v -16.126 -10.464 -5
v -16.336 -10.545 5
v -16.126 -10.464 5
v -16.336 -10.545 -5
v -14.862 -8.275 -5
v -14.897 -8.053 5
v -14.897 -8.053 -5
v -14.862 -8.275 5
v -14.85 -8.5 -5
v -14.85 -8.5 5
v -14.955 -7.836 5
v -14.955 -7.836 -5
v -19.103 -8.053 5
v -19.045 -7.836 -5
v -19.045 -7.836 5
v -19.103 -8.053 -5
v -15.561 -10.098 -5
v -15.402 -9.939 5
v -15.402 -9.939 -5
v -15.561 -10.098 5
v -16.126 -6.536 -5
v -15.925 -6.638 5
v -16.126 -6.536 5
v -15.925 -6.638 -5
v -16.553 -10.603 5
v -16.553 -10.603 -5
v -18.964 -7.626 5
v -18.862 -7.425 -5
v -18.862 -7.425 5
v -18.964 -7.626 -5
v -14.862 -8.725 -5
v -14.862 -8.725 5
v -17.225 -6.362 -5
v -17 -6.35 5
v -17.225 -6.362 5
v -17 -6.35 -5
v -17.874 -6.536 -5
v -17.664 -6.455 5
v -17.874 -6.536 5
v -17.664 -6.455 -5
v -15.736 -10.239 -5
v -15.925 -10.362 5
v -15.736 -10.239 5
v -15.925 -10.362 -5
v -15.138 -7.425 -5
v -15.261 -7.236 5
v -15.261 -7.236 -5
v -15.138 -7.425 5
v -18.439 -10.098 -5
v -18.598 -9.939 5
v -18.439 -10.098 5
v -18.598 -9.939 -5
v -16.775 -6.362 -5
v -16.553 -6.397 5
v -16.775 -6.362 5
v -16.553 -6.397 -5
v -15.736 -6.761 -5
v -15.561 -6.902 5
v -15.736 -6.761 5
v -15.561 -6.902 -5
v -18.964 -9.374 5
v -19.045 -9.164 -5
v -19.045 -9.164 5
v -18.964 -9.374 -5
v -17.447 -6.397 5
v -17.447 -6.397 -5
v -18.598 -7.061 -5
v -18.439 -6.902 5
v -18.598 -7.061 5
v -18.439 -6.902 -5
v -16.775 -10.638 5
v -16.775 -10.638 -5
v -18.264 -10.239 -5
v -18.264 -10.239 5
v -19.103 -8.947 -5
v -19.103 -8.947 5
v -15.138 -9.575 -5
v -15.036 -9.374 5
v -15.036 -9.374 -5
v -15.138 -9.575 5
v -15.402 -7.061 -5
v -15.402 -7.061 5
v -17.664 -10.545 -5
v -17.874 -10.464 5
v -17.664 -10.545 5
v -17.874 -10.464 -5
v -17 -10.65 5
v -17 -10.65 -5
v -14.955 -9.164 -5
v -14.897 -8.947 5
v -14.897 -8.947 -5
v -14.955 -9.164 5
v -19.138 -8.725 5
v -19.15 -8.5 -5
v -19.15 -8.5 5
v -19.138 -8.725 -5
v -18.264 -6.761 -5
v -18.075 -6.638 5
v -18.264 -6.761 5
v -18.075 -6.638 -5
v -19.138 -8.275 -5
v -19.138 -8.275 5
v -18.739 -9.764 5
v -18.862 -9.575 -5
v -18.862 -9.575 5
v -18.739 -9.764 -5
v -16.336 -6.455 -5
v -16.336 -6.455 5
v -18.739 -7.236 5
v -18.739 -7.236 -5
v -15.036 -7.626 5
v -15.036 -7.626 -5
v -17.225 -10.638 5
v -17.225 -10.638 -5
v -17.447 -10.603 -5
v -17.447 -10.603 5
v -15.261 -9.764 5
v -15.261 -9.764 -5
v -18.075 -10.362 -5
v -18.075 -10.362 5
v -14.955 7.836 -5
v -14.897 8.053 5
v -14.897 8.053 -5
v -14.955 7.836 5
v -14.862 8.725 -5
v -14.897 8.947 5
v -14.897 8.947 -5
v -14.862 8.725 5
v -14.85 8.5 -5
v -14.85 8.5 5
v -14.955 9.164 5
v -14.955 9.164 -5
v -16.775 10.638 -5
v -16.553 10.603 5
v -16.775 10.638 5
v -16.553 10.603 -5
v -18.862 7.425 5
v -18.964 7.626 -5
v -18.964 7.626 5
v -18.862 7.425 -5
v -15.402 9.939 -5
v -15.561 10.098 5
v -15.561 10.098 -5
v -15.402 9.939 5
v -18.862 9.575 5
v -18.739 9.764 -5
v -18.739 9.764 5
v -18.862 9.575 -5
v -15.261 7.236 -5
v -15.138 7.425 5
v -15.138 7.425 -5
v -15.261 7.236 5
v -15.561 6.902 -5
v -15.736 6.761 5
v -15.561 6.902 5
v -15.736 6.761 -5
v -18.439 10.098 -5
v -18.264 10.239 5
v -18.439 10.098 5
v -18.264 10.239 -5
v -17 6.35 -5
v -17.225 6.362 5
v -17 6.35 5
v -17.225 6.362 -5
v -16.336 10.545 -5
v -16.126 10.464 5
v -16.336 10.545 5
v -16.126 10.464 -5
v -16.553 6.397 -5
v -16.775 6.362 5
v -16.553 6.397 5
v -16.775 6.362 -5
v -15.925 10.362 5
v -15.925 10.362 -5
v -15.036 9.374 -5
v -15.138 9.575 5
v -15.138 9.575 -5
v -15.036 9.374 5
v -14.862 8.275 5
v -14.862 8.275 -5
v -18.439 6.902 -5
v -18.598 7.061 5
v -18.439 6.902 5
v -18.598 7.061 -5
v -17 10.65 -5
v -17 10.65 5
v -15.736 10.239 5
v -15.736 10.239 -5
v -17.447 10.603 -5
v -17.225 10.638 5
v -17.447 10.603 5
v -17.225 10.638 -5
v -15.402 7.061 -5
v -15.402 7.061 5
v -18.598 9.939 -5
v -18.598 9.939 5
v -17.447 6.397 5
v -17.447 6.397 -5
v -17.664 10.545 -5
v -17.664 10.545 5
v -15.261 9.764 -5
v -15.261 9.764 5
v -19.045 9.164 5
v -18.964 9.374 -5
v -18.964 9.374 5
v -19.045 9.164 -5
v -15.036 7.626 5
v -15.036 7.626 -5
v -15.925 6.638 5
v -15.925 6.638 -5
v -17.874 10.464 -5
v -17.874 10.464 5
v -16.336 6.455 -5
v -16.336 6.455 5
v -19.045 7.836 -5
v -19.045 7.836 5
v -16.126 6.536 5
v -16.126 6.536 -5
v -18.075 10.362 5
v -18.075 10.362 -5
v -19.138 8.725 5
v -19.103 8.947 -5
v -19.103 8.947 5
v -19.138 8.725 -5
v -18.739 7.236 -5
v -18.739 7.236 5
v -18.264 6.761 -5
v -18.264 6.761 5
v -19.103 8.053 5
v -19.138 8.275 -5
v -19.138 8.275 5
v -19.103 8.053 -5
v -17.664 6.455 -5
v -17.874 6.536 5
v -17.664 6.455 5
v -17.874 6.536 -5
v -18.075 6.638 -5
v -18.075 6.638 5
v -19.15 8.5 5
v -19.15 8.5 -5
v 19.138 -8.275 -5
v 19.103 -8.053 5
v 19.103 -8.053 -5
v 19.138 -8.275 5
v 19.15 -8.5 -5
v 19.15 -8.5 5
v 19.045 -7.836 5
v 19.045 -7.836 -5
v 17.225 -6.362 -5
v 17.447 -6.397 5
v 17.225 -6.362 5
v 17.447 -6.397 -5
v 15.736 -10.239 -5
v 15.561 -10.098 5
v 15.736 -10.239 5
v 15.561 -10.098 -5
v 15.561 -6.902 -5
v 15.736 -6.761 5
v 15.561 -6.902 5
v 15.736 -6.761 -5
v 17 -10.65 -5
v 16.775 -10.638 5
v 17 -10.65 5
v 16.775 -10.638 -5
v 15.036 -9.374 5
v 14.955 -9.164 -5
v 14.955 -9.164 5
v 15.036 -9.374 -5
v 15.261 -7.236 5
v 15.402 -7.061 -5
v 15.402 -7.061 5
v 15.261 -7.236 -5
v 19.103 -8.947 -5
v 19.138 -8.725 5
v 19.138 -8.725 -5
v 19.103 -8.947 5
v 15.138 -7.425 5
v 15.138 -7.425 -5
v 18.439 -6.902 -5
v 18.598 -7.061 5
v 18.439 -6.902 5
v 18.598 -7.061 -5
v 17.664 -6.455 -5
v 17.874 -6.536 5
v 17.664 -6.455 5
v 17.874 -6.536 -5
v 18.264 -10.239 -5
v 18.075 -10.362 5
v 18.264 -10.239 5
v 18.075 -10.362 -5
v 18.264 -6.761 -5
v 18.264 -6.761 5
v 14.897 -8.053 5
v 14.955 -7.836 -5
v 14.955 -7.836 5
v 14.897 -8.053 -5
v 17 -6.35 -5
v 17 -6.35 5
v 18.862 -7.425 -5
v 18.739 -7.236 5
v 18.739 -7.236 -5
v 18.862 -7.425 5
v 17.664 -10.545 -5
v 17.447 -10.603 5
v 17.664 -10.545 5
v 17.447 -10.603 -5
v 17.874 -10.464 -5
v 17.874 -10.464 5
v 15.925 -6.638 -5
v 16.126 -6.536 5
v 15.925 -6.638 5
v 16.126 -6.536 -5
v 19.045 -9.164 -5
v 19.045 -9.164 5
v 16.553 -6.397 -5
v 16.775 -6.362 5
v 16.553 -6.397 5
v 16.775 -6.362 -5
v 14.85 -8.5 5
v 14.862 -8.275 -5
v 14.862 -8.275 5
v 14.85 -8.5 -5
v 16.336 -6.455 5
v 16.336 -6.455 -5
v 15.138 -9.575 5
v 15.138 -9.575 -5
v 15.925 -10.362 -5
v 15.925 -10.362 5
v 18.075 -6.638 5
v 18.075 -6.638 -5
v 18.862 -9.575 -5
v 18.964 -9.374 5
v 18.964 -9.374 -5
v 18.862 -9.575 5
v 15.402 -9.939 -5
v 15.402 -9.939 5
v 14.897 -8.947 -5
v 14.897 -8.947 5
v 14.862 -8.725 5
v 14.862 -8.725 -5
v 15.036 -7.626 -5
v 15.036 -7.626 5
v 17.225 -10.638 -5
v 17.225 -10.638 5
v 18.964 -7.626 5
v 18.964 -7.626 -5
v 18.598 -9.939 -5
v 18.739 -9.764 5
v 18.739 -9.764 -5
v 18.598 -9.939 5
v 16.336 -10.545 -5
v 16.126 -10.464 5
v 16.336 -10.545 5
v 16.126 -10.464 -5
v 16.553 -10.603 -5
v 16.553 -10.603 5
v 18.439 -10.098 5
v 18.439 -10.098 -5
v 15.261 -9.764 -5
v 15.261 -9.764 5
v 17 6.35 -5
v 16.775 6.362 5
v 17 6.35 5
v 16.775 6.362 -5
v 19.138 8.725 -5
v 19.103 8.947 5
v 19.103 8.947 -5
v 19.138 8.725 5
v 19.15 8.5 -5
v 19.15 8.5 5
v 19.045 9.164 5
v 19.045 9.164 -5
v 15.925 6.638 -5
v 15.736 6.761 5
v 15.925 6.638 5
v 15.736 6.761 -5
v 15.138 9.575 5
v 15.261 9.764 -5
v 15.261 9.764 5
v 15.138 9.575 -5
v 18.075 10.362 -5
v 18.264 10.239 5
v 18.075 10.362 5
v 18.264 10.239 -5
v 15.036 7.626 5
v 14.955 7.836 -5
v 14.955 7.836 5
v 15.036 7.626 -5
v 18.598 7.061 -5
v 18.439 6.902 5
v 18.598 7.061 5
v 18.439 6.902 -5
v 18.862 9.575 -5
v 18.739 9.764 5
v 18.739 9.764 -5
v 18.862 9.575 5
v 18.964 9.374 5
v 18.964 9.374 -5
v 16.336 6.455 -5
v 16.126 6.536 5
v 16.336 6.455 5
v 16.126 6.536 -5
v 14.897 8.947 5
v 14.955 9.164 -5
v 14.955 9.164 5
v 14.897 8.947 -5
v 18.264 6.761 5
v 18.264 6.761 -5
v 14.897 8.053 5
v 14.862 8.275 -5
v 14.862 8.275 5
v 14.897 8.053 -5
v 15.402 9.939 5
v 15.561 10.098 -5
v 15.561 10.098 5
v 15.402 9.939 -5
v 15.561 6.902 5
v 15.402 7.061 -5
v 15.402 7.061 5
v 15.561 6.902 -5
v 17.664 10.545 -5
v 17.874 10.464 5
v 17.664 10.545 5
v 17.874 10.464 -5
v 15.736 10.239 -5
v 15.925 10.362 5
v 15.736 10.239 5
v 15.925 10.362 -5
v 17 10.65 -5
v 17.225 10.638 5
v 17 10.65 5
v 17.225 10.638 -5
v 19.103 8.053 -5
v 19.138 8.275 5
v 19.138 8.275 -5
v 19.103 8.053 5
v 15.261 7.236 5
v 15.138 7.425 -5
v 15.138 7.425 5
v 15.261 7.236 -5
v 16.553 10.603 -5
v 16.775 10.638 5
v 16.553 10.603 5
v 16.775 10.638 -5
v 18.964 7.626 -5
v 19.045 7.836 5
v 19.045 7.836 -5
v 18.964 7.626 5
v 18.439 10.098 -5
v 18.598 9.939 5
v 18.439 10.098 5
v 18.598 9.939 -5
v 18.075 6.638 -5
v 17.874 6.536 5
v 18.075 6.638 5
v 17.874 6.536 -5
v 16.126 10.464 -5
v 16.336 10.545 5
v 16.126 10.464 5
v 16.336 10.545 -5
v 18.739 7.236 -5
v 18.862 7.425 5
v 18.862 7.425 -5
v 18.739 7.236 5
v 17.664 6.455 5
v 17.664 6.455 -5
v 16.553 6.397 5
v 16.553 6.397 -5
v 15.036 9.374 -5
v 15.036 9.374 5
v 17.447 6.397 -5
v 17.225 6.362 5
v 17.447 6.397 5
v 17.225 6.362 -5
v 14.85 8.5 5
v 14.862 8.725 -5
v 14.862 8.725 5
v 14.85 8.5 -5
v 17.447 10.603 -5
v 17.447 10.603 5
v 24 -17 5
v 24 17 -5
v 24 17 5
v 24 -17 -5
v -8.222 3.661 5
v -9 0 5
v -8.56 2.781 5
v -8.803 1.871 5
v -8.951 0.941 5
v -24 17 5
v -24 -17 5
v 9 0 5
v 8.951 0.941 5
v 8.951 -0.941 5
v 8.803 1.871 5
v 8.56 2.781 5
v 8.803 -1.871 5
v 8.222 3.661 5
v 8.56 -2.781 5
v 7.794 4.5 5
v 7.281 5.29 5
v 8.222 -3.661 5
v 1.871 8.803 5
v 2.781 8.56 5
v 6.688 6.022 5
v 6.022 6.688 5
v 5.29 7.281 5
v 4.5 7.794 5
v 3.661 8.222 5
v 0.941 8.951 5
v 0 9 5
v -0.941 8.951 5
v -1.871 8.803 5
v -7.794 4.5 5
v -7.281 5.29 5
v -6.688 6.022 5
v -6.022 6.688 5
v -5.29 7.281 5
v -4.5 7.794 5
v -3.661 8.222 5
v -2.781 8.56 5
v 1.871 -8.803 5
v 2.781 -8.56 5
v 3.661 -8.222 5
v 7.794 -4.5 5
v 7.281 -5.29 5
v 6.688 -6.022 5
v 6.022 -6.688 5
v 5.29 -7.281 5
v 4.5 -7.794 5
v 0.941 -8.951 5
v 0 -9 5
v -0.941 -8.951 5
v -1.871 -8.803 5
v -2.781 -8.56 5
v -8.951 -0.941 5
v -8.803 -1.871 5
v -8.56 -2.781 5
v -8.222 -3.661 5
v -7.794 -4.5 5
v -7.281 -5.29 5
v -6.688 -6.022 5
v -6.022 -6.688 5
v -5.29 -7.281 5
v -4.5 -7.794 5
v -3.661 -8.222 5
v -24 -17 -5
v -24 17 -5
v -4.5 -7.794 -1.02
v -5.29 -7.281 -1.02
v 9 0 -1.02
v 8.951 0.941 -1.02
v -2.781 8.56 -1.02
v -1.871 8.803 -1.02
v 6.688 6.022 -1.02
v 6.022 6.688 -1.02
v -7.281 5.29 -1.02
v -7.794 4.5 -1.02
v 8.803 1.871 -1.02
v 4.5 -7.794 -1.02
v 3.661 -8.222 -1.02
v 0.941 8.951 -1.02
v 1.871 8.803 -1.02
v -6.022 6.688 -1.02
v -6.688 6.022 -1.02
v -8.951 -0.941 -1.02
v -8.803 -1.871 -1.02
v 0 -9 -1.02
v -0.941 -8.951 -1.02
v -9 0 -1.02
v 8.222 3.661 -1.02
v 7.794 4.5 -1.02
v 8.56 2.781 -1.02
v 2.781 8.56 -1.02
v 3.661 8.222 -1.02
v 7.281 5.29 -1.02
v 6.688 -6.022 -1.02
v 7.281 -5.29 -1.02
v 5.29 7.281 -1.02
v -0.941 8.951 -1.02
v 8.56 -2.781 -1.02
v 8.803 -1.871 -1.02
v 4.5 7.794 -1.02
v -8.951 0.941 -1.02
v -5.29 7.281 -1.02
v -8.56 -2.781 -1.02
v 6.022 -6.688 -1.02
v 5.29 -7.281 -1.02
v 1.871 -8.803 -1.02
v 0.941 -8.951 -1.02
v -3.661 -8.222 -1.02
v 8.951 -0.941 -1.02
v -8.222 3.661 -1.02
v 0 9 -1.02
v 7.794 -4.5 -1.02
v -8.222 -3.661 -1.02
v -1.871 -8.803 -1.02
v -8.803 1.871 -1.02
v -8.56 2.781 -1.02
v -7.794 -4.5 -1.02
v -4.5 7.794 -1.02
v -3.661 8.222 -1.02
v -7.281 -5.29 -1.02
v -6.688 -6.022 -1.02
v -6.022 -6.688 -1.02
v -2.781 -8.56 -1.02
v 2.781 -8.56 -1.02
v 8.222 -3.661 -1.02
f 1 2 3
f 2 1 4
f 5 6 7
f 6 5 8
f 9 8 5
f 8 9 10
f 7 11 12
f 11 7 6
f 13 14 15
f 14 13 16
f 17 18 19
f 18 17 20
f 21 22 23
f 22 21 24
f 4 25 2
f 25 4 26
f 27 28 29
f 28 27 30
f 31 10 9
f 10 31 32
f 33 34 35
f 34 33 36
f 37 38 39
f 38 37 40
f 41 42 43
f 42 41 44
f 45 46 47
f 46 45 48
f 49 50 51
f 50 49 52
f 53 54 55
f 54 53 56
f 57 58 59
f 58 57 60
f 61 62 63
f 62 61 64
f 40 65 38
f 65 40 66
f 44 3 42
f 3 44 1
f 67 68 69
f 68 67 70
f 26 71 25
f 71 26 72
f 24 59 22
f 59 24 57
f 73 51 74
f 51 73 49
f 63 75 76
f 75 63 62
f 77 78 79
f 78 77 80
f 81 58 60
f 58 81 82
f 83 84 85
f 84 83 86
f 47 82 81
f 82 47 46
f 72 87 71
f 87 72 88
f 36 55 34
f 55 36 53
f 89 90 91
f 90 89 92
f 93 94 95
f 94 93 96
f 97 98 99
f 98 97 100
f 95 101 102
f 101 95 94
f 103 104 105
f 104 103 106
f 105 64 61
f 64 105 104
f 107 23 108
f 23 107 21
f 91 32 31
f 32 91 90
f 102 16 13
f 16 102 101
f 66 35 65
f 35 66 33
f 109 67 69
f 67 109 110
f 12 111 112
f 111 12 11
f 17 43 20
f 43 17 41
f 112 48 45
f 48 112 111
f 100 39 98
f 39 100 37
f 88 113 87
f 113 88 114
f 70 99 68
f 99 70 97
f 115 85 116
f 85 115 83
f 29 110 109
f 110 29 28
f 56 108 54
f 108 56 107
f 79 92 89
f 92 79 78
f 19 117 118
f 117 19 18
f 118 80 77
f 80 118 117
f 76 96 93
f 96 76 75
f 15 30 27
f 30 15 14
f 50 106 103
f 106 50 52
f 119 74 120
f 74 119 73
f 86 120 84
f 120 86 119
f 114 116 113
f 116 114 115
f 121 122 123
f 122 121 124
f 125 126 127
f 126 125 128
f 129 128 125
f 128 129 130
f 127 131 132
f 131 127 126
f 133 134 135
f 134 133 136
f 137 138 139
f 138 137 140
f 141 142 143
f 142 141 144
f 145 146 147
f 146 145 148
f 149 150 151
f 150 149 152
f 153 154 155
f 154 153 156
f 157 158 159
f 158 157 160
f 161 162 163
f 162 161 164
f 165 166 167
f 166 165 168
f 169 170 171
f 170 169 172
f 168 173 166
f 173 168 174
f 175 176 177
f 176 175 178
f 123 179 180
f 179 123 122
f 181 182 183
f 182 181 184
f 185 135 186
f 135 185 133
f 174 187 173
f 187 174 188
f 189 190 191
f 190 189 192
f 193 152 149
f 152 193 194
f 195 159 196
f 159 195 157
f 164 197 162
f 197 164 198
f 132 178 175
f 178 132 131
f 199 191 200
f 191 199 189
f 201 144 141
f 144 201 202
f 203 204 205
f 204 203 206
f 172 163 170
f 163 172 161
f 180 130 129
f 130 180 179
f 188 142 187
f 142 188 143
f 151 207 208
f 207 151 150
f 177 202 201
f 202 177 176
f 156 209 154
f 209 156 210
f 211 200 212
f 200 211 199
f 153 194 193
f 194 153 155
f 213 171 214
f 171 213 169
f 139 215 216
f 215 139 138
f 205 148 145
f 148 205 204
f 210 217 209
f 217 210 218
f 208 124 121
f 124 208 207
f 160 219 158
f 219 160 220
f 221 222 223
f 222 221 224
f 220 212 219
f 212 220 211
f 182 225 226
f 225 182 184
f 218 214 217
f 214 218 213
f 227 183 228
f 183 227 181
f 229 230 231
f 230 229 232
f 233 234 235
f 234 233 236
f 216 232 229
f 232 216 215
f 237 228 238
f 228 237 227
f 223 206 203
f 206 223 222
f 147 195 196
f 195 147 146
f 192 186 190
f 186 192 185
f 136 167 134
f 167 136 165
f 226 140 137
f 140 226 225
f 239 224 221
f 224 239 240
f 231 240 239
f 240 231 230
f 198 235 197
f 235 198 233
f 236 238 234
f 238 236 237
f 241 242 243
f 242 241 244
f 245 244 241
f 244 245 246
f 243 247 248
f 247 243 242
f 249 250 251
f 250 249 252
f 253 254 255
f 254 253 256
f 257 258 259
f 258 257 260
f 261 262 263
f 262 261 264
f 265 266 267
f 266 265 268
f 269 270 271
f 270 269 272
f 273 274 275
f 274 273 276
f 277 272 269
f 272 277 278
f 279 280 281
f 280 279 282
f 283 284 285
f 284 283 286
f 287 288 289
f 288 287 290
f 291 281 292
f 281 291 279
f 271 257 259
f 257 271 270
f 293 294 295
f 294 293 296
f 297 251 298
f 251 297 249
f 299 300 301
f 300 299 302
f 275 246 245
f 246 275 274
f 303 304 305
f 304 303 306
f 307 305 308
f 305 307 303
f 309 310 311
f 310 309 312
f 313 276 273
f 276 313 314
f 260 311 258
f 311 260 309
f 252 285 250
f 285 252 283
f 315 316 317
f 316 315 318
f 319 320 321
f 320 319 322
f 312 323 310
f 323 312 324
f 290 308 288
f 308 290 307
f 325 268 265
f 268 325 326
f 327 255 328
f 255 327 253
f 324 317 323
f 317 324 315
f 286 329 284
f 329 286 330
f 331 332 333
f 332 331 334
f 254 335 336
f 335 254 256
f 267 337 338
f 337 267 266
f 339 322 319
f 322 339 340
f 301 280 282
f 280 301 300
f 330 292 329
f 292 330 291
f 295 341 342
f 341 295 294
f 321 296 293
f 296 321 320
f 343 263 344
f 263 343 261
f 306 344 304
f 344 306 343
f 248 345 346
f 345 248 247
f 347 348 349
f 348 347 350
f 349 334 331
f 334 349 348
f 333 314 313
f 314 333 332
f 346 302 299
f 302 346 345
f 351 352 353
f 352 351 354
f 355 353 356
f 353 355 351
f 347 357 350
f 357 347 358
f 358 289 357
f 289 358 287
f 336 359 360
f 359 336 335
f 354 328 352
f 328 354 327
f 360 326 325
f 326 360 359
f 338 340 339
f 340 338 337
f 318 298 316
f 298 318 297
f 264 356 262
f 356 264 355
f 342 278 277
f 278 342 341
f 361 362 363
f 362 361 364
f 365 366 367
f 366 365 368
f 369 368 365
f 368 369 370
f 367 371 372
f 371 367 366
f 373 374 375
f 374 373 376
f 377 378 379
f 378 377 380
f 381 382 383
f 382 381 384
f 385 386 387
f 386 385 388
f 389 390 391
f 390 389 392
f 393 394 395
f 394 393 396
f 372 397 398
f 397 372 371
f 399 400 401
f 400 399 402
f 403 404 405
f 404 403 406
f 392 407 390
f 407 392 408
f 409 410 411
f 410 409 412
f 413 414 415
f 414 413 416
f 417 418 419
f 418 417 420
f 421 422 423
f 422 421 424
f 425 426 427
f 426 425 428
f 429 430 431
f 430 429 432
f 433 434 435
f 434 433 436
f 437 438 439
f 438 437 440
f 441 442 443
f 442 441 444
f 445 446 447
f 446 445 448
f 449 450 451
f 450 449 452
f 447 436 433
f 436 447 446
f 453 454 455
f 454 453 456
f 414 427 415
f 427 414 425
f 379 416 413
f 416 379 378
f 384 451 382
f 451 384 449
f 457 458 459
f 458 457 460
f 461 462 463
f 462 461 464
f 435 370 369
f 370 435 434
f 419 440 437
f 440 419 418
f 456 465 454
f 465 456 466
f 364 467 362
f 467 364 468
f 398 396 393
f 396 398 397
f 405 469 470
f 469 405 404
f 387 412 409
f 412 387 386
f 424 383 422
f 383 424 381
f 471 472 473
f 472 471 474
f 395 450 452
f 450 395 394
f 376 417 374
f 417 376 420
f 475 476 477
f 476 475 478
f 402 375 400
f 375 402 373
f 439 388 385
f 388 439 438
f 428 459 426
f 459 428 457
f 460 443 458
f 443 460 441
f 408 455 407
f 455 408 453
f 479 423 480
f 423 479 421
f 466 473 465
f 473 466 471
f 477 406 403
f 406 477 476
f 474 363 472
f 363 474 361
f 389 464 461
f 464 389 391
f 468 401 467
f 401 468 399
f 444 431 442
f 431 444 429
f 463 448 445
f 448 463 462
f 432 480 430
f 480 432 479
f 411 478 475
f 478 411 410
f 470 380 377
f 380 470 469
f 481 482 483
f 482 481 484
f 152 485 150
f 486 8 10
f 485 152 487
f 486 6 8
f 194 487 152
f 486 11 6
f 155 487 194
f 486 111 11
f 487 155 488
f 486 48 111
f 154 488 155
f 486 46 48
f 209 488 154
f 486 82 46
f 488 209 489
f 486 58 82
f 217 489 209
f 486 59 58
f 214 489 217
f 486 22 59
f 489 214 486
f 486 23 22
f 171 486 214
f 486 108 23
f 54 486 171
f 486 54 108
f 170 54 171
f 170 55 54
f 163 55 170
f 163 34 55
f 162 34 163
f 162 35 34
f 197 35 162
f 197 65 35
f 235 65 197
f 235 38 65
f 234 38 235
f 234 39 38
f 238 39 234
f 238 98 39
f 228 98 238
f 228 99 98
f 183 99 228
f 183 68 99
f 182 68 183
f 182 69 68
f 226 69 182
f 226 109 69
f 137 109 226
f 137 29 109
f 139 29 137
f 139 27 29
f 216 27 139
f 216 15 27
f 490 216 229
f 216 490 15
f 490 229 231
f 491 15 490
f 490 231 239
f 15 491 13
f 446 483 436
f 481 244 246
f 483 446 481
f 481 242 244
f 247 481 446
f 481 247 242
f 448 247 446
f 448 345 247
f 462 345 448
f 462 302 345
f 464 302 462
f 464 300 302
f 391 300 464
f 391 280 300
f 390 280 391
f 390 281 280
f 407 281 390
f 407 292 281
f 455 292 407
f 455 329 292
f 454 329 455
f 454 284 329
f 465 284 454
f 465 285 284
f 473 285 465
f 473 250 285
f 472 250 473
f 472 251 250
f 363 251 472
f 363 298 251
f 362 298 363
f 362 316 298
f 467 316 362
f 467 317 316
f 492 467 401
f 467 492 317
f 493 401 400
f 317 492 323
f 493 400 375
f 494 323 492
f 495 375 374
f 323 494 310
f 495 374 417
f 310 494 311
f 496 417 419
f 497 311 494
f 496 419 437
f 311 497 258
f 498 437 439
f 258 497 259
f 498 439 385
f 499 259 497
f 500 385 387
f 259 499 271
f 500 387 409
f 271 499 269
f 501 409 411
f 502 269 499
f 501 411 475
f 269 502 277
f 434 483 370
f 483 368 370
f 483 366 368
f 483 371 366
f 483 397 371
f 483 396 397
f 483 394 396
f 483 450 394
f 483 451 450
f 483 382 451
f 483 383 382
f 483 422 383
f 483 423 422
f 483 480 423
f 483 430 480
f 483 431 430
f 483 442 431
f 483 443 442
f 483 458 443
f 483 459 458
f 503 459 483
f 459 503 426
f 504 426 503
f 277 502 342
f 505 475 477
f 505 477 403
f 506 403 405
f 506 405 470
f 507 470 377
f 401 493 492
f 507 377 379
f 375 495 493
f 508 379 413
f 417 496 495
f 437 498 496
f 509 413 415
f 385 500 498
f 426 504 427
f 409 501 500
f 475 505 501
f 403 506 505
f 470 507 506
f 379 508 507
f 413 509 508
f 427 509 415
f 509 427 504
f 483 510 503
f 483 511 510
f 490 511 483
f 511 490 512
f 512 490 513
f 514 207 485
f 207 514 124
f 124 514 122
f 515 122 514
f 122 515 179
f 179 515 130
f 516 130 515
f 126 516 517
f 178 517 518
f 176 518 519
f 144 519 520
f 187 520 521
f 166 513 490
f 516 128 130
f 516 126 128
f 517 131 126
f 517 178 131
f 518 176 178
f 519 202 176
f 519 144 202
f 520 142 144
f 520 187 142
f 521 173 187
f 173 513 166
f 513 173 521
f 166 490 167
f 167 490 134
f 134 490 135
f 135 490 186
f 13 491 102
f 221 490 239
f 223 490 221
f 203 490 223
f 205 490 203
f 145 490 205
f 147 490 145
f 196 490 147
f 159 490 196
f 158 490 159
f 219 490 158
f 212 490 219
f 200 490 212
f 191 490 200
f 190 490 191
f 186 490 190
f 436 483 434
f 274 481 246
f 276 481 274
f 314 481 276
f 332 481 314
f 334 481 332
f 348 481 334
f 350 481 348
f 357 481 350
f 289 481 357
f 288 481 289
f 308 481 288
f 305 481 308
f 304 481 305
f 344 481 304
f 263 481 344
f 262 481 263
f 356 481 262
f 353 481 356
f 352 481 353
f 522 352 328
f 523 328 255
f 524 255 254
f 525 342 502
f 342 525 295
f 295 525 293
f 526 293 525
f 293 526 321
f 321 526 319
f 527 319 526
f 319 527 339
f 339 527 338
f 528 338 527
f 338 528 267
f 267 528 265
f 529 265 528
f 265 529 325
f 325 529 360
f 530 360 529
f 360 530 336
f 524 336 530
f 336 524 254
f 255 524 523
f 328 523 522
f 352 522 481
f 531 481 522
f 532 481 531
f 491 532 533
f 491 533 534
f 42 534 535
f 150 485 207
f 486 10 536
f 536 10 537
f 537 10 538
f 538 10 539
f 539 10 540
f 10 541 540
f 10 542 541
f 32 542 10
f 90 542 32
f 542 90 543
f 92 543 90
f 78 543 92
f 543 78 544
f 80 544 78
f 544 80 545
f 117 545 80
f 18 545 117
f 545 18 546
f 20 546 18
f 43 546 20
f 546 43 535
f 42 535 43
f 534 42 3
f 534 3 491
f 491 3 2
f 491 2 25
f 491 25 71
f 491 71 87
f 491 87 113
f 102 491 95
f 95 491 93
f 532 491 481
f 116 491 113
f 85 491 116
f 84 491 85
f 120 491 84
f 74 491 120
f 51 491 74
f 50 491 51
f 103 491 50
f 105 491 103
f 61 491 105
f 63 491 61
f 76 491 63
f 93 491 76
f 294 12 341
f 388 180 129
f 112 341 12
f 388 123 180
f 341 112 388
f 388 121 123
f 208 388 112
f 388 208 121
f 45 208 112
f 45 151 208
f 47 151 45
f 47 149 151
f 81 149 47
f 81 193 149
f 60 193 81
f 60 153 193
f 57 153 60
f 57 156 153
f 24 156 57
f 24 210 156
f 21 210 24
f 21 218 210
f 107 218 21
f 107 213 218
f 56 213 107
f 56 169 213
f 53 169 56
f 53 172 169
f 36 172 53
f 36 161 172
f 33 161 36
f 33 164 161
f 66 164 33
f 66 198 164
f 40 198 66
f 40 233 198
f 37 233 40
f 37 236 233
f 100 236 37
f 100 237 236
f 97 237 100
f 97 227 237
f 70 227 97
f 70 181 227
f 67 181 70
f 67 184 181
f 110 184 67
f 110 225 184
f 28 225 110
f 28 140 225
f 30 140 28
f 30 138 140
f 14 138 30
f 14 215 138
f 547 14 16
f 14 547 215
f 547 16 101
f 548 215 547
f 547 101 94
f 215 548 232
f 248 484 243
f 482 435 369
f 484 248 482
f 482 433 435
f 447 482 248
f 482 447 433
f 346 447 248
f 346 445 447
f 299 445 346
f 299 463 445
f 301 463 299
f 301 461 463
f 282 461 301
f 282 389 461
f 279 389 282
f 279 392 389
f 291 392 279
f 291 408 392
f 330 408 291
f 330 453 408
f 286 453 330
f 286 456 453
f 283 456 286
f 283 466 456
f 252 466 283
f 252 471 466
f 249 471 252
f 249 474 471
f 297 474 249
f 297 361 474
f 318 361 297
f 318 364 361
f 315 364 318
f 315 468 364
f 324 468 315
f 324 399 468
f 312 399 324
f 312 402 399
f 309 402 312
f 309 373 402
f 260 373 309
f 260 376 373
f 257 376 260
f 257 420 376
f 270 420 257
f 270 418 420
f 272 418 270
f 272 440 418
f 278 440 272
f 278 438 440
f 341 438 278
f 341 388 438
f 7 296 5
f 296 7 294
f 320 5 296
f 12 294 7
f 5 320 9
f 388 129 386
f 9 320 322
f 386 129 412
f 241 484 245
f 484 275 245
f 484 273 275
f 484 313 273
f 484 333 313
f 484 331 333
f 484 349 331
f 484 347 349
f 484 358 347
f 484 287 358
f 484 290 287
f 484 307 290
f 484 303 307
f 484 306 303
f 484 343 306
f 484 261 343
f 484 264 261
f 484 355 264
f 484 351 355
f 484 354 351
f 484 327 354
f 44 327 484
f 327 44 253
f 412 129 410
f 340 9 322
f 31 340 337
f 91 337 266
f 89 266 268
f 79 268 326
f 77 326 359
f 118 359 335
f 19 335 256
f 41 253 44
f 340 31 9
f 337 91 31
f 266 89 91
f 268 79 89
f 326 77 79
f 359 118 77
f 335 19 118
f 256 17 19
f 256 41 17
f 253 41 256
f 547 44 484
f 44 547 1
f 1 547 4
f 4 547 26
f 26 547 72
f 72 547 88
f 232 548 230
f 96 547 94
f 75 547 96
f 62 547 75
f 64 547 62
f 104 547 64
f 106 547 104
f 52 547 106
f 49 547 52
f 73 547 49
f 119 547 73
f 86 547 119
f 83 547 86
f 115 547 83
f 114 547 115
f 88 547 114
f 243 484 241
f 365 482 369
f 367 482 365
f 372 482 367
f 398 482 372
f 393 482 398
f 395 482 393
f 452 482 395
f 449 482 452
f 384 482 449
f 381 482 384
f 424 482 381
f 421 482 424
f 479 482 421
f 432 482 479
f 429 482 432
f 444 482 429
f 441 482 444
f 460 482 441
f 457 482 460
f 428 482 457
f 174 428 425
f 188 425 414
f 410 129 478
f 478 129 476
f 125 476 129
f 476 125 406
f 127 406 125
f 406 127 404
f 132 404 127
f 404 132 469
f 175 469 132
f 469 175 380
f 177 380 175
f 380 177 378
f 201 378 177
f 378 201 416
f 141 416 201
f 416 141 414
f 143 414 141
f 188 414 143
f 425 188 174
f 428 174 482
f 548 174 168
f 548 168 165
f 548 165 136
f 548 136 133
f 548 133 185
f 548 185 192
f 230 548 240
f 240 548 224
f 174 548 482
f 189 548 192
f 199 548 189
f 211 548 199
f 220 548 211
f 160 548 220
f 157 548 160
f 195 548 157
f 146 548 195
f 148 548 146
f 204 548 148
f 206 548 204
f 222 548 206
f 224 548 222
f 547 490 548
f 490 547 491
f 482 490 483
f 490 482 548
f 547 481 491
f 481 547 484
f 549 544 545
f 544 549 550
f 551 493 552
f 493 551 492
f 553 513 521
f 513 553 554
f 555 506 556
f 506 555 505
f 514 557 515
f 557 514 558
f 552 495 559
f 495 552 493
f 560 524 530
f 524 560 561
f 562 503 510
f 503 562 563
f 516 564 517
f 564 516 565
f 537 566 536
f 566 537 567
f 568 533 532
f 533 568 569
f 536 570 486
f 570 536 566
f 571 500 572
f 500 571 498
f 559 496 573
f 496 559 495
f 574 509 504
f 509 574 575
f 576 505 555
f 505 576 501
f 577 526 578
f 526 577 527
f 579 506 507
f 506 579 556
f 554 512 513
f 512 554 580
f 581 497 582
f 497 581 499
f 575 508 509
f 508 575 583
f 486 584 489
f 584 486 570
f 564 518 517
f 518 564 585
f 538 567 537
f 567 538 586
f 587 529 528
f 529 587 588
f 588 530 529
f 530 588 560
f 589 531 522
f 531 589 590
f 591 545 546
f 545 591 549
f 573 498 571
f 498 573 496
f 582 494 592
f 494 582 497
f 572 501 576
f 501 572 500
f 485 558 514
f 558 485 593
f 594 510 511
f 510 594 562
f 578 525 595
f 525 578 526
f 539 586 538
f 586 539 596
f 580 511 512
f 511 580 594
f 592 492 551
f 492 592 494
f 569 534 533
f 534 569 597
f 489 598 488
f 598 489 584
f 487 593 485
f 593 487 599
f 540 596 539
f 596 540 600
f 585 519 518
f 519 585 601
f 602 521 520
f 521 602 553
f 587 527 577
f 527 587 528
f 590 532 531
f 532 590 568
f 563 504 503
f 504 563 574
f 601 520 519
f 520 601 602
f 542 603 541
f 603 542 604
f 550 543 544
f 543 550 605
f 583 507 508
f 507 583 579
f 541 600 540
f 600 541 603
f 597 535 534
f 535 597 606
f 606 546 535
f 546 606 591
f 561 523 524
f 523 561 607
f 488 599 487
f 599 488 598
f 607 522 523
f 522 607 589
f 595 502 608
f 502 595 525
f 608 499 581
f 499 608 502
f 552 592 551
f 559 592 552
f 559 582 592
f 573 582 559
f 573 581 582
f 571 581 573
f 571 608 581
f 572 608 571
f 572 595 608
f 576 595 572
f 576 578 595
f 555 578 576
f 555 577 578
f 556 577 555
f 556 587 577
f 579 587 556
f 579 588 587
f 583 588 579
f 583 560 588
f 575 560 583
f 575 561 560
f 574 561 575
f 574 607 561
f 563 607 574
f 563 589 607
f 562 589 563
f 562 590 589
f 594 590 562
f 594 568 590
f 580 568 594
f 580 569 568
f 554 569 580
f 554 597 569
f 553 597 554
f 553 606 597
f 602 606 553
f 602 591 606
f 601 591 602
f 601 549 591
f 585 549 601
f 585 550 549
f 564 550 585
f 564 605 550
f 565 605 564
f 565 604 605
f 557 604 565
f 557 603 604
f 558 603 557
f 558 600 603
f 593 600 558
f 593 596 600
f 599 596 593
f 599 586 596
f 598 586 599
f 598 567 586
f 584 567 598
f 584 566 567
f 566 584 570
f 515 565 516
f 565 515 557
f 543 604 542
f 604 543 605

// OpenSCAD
// Lead-screw nut holder with 18 mm pocket.
$fn = 60;
eps = 0.02;
body_l = 48;
body_w = 34;
body_t = 10;
pocket_d = 18;
pocket_depth = 6;
mount_x = 17.0;
difference() {
    cube([body_l, body_w, body_t], center = true);
    translate([0, 0, body_t / 2 - pocket_depth - eps]) cylinder(d = pocket_d, h = pocket_depth + 2 * eps);
    for (x = [-mount_x, mount_x], y = [-body_w / 4, body_w / 4])
        translate([x, y, -body_t / 2 - eps]) cylinder(d = 4.3, h = body_t + 2 * eps);
}
